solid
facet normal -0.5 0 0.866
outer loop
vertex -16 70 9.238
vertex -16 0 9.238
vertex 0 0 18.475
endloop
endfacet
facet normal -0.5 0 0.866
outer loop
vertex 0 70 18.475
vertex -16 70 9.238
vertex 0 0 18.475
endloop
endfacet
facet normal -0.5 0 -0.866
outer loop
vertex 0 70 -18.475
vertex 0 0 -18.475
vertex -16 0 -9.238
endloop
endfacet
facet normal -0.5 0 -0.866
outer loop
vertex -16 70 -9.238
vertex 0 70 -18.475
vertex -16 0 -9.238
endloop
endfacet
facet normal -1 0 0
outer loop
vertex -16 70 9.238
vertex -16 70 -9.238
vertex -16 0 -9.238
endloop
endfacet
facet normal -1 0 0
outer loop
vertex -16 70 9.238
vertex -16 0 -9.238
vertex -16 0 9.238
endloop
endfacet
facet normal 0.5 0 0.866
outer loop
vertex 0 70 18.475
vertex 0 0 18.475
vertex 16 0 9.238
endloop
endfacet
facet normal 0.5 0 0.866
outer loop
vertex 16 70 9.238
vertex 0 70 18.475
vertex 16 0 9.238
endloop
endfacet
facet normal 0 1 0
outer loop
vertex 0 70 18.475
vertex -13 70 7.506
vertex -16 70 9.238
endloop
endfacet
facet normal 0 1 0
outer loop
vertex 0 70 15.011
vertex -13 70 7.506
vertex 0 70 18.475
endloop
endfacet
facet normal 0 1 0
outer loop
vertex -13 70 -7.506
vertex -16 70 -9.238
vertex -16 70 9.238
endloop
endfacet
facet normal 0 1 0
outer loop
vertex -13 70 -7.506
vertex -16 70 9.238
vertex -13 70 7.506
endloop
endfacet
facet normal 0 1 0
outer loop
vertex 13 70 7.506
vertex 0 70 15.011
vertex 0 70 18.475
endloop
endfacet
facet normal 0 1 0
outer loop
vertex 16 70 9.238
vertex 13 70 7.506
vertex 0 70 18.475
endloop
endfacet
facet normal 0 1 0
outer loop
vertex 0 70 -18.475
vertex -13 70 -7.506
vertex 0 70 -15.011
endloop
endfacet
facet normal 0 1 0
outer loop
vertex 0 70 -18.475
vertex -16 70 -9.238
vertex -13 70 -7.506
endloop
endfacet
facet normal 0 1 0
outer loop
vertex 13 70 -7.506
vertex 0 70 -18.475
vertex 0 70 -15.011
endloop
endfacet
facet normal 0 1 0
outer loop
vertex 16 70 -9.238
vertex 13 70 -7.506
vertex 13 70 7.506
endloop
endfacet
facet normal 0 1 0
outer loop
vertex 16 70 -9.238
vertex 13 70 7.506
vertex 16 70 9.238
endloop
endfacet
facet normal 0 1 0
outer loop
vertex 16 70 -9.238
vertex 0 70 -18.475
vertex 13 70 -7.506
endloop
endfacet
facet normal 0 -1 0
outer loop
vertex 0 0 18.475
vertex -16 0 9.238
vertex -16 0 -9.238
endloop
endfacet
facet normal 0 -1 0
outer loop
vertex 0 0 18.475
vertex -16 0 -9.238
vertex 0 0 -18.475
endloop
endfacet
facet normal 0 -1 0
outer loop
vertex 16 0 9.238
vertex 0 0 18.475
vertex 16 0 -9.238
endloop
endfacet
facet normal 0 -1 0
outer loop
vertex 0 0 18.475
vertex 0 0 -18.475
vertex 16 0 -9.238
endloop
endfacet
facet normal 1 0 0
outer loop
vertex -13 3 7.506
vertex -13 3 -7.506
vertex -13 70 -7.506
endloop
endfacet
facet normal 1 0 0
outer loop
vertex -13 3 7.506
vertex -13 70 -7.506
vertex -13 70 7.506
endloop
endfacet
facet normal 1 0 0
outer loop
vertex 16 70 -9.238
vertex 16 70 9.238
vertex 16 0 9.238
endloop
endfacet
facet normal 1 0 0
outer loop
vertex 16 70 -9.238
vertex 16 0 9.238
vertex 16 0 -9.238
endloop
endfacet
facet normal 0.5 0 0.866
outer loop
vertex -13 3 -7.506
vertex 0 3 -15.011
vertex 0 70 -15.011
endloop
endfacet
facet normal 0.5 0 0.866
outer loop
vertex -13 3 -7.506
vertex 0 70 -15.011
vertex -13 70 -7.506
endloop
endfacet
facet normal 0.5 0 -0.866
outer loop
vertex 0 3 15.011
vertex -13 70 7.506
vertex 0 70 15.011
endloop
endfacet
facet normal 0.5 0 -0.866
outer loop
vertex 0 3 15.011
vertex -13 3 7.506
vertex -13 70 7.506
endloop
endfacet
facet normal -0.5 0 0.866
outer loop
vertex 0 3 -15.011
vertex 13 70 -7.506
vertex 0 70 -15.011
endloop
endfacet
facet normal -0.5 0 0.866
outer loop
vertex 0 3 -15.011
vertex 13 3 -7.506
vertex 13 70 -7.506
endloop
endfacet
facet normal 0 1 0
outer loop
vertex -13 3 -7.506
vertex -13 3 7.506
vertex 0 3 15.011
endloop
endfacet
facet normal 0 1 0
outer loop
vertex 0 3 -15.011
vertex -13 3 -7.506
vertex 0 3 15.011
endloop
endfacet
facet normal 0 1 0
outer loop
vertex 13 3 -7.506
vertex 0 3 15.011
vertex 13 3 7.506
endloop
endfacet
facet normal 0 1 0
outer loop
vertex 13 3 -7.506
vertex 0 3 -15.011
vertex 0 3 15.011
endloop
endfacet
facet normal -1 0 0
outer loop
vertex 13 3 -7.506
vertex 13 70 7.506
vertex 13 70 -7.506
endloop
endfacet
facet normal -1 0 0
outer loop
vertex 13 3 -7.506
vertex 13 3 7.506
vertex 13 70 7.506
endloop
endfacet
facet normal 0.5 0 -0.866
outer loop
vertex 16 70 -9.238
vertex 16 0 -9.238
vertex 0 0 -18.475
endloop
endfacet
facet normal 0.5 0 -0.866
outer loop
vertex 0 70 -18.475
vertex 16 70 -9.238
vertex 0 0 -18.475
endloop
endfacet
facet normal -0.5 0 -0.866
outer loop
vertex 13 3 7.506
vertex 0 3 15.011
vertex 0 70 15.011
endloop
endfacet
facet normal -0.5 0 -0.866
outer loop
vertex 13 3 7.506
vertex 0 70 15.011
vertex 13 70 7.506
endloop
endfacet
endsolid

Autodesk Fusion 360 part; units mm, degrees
sketch "Sketch1" plane through (0, 0, 0) normal (0, 1, 0) x (1, 0, 0)
  line L0 (16, 9.2376) -> (0, 18.4752)
  line L1 (0, 18.4752) -> (-16, 9.2376)
  line L2 (-16, 9.2376) -> (-16, -9.2376)
  line L3 (-16, -9.2376) -> (0, -18.4752)
  line L4 (0, -18.4752) -> (16, -9.2376)
  line L5 (16, -9.2376) -> (16, 9.2376)
  line L6 (13, 7.5056) -> (0, 15.0111)
  line L7 (0, 15.0111) -> (-13, 7.5056)
  line L8 (-13, 7.5056) -> (-13, -7.5056)
  line L9 (-13, -7.5056) -> (0, -15.0111)
  line L10 (0, -15.0111) -> (13, -7.5056)
  line L11 (13, -7.5056) -> (13, 7.5056)
  dimension "d1" = 16
  dimension "d2" = 3
extrude "Extrude1" add sketch "Sketch1" along normal blind 70 makes body 1
extrude "Extrude2" add sketch "Sketch1" along normal blind 3 contours L6 L7 L8 L9 L10 L11 bodies 1
copy_body "Body->Comp1" bodies 1 removing the originals makes body 2 in component "hexagon-02"
component "hexagon-02" placed x (1, 0, 0) y (0, 1, 0) z (0, 0, 1) at (0, 0, 0)
